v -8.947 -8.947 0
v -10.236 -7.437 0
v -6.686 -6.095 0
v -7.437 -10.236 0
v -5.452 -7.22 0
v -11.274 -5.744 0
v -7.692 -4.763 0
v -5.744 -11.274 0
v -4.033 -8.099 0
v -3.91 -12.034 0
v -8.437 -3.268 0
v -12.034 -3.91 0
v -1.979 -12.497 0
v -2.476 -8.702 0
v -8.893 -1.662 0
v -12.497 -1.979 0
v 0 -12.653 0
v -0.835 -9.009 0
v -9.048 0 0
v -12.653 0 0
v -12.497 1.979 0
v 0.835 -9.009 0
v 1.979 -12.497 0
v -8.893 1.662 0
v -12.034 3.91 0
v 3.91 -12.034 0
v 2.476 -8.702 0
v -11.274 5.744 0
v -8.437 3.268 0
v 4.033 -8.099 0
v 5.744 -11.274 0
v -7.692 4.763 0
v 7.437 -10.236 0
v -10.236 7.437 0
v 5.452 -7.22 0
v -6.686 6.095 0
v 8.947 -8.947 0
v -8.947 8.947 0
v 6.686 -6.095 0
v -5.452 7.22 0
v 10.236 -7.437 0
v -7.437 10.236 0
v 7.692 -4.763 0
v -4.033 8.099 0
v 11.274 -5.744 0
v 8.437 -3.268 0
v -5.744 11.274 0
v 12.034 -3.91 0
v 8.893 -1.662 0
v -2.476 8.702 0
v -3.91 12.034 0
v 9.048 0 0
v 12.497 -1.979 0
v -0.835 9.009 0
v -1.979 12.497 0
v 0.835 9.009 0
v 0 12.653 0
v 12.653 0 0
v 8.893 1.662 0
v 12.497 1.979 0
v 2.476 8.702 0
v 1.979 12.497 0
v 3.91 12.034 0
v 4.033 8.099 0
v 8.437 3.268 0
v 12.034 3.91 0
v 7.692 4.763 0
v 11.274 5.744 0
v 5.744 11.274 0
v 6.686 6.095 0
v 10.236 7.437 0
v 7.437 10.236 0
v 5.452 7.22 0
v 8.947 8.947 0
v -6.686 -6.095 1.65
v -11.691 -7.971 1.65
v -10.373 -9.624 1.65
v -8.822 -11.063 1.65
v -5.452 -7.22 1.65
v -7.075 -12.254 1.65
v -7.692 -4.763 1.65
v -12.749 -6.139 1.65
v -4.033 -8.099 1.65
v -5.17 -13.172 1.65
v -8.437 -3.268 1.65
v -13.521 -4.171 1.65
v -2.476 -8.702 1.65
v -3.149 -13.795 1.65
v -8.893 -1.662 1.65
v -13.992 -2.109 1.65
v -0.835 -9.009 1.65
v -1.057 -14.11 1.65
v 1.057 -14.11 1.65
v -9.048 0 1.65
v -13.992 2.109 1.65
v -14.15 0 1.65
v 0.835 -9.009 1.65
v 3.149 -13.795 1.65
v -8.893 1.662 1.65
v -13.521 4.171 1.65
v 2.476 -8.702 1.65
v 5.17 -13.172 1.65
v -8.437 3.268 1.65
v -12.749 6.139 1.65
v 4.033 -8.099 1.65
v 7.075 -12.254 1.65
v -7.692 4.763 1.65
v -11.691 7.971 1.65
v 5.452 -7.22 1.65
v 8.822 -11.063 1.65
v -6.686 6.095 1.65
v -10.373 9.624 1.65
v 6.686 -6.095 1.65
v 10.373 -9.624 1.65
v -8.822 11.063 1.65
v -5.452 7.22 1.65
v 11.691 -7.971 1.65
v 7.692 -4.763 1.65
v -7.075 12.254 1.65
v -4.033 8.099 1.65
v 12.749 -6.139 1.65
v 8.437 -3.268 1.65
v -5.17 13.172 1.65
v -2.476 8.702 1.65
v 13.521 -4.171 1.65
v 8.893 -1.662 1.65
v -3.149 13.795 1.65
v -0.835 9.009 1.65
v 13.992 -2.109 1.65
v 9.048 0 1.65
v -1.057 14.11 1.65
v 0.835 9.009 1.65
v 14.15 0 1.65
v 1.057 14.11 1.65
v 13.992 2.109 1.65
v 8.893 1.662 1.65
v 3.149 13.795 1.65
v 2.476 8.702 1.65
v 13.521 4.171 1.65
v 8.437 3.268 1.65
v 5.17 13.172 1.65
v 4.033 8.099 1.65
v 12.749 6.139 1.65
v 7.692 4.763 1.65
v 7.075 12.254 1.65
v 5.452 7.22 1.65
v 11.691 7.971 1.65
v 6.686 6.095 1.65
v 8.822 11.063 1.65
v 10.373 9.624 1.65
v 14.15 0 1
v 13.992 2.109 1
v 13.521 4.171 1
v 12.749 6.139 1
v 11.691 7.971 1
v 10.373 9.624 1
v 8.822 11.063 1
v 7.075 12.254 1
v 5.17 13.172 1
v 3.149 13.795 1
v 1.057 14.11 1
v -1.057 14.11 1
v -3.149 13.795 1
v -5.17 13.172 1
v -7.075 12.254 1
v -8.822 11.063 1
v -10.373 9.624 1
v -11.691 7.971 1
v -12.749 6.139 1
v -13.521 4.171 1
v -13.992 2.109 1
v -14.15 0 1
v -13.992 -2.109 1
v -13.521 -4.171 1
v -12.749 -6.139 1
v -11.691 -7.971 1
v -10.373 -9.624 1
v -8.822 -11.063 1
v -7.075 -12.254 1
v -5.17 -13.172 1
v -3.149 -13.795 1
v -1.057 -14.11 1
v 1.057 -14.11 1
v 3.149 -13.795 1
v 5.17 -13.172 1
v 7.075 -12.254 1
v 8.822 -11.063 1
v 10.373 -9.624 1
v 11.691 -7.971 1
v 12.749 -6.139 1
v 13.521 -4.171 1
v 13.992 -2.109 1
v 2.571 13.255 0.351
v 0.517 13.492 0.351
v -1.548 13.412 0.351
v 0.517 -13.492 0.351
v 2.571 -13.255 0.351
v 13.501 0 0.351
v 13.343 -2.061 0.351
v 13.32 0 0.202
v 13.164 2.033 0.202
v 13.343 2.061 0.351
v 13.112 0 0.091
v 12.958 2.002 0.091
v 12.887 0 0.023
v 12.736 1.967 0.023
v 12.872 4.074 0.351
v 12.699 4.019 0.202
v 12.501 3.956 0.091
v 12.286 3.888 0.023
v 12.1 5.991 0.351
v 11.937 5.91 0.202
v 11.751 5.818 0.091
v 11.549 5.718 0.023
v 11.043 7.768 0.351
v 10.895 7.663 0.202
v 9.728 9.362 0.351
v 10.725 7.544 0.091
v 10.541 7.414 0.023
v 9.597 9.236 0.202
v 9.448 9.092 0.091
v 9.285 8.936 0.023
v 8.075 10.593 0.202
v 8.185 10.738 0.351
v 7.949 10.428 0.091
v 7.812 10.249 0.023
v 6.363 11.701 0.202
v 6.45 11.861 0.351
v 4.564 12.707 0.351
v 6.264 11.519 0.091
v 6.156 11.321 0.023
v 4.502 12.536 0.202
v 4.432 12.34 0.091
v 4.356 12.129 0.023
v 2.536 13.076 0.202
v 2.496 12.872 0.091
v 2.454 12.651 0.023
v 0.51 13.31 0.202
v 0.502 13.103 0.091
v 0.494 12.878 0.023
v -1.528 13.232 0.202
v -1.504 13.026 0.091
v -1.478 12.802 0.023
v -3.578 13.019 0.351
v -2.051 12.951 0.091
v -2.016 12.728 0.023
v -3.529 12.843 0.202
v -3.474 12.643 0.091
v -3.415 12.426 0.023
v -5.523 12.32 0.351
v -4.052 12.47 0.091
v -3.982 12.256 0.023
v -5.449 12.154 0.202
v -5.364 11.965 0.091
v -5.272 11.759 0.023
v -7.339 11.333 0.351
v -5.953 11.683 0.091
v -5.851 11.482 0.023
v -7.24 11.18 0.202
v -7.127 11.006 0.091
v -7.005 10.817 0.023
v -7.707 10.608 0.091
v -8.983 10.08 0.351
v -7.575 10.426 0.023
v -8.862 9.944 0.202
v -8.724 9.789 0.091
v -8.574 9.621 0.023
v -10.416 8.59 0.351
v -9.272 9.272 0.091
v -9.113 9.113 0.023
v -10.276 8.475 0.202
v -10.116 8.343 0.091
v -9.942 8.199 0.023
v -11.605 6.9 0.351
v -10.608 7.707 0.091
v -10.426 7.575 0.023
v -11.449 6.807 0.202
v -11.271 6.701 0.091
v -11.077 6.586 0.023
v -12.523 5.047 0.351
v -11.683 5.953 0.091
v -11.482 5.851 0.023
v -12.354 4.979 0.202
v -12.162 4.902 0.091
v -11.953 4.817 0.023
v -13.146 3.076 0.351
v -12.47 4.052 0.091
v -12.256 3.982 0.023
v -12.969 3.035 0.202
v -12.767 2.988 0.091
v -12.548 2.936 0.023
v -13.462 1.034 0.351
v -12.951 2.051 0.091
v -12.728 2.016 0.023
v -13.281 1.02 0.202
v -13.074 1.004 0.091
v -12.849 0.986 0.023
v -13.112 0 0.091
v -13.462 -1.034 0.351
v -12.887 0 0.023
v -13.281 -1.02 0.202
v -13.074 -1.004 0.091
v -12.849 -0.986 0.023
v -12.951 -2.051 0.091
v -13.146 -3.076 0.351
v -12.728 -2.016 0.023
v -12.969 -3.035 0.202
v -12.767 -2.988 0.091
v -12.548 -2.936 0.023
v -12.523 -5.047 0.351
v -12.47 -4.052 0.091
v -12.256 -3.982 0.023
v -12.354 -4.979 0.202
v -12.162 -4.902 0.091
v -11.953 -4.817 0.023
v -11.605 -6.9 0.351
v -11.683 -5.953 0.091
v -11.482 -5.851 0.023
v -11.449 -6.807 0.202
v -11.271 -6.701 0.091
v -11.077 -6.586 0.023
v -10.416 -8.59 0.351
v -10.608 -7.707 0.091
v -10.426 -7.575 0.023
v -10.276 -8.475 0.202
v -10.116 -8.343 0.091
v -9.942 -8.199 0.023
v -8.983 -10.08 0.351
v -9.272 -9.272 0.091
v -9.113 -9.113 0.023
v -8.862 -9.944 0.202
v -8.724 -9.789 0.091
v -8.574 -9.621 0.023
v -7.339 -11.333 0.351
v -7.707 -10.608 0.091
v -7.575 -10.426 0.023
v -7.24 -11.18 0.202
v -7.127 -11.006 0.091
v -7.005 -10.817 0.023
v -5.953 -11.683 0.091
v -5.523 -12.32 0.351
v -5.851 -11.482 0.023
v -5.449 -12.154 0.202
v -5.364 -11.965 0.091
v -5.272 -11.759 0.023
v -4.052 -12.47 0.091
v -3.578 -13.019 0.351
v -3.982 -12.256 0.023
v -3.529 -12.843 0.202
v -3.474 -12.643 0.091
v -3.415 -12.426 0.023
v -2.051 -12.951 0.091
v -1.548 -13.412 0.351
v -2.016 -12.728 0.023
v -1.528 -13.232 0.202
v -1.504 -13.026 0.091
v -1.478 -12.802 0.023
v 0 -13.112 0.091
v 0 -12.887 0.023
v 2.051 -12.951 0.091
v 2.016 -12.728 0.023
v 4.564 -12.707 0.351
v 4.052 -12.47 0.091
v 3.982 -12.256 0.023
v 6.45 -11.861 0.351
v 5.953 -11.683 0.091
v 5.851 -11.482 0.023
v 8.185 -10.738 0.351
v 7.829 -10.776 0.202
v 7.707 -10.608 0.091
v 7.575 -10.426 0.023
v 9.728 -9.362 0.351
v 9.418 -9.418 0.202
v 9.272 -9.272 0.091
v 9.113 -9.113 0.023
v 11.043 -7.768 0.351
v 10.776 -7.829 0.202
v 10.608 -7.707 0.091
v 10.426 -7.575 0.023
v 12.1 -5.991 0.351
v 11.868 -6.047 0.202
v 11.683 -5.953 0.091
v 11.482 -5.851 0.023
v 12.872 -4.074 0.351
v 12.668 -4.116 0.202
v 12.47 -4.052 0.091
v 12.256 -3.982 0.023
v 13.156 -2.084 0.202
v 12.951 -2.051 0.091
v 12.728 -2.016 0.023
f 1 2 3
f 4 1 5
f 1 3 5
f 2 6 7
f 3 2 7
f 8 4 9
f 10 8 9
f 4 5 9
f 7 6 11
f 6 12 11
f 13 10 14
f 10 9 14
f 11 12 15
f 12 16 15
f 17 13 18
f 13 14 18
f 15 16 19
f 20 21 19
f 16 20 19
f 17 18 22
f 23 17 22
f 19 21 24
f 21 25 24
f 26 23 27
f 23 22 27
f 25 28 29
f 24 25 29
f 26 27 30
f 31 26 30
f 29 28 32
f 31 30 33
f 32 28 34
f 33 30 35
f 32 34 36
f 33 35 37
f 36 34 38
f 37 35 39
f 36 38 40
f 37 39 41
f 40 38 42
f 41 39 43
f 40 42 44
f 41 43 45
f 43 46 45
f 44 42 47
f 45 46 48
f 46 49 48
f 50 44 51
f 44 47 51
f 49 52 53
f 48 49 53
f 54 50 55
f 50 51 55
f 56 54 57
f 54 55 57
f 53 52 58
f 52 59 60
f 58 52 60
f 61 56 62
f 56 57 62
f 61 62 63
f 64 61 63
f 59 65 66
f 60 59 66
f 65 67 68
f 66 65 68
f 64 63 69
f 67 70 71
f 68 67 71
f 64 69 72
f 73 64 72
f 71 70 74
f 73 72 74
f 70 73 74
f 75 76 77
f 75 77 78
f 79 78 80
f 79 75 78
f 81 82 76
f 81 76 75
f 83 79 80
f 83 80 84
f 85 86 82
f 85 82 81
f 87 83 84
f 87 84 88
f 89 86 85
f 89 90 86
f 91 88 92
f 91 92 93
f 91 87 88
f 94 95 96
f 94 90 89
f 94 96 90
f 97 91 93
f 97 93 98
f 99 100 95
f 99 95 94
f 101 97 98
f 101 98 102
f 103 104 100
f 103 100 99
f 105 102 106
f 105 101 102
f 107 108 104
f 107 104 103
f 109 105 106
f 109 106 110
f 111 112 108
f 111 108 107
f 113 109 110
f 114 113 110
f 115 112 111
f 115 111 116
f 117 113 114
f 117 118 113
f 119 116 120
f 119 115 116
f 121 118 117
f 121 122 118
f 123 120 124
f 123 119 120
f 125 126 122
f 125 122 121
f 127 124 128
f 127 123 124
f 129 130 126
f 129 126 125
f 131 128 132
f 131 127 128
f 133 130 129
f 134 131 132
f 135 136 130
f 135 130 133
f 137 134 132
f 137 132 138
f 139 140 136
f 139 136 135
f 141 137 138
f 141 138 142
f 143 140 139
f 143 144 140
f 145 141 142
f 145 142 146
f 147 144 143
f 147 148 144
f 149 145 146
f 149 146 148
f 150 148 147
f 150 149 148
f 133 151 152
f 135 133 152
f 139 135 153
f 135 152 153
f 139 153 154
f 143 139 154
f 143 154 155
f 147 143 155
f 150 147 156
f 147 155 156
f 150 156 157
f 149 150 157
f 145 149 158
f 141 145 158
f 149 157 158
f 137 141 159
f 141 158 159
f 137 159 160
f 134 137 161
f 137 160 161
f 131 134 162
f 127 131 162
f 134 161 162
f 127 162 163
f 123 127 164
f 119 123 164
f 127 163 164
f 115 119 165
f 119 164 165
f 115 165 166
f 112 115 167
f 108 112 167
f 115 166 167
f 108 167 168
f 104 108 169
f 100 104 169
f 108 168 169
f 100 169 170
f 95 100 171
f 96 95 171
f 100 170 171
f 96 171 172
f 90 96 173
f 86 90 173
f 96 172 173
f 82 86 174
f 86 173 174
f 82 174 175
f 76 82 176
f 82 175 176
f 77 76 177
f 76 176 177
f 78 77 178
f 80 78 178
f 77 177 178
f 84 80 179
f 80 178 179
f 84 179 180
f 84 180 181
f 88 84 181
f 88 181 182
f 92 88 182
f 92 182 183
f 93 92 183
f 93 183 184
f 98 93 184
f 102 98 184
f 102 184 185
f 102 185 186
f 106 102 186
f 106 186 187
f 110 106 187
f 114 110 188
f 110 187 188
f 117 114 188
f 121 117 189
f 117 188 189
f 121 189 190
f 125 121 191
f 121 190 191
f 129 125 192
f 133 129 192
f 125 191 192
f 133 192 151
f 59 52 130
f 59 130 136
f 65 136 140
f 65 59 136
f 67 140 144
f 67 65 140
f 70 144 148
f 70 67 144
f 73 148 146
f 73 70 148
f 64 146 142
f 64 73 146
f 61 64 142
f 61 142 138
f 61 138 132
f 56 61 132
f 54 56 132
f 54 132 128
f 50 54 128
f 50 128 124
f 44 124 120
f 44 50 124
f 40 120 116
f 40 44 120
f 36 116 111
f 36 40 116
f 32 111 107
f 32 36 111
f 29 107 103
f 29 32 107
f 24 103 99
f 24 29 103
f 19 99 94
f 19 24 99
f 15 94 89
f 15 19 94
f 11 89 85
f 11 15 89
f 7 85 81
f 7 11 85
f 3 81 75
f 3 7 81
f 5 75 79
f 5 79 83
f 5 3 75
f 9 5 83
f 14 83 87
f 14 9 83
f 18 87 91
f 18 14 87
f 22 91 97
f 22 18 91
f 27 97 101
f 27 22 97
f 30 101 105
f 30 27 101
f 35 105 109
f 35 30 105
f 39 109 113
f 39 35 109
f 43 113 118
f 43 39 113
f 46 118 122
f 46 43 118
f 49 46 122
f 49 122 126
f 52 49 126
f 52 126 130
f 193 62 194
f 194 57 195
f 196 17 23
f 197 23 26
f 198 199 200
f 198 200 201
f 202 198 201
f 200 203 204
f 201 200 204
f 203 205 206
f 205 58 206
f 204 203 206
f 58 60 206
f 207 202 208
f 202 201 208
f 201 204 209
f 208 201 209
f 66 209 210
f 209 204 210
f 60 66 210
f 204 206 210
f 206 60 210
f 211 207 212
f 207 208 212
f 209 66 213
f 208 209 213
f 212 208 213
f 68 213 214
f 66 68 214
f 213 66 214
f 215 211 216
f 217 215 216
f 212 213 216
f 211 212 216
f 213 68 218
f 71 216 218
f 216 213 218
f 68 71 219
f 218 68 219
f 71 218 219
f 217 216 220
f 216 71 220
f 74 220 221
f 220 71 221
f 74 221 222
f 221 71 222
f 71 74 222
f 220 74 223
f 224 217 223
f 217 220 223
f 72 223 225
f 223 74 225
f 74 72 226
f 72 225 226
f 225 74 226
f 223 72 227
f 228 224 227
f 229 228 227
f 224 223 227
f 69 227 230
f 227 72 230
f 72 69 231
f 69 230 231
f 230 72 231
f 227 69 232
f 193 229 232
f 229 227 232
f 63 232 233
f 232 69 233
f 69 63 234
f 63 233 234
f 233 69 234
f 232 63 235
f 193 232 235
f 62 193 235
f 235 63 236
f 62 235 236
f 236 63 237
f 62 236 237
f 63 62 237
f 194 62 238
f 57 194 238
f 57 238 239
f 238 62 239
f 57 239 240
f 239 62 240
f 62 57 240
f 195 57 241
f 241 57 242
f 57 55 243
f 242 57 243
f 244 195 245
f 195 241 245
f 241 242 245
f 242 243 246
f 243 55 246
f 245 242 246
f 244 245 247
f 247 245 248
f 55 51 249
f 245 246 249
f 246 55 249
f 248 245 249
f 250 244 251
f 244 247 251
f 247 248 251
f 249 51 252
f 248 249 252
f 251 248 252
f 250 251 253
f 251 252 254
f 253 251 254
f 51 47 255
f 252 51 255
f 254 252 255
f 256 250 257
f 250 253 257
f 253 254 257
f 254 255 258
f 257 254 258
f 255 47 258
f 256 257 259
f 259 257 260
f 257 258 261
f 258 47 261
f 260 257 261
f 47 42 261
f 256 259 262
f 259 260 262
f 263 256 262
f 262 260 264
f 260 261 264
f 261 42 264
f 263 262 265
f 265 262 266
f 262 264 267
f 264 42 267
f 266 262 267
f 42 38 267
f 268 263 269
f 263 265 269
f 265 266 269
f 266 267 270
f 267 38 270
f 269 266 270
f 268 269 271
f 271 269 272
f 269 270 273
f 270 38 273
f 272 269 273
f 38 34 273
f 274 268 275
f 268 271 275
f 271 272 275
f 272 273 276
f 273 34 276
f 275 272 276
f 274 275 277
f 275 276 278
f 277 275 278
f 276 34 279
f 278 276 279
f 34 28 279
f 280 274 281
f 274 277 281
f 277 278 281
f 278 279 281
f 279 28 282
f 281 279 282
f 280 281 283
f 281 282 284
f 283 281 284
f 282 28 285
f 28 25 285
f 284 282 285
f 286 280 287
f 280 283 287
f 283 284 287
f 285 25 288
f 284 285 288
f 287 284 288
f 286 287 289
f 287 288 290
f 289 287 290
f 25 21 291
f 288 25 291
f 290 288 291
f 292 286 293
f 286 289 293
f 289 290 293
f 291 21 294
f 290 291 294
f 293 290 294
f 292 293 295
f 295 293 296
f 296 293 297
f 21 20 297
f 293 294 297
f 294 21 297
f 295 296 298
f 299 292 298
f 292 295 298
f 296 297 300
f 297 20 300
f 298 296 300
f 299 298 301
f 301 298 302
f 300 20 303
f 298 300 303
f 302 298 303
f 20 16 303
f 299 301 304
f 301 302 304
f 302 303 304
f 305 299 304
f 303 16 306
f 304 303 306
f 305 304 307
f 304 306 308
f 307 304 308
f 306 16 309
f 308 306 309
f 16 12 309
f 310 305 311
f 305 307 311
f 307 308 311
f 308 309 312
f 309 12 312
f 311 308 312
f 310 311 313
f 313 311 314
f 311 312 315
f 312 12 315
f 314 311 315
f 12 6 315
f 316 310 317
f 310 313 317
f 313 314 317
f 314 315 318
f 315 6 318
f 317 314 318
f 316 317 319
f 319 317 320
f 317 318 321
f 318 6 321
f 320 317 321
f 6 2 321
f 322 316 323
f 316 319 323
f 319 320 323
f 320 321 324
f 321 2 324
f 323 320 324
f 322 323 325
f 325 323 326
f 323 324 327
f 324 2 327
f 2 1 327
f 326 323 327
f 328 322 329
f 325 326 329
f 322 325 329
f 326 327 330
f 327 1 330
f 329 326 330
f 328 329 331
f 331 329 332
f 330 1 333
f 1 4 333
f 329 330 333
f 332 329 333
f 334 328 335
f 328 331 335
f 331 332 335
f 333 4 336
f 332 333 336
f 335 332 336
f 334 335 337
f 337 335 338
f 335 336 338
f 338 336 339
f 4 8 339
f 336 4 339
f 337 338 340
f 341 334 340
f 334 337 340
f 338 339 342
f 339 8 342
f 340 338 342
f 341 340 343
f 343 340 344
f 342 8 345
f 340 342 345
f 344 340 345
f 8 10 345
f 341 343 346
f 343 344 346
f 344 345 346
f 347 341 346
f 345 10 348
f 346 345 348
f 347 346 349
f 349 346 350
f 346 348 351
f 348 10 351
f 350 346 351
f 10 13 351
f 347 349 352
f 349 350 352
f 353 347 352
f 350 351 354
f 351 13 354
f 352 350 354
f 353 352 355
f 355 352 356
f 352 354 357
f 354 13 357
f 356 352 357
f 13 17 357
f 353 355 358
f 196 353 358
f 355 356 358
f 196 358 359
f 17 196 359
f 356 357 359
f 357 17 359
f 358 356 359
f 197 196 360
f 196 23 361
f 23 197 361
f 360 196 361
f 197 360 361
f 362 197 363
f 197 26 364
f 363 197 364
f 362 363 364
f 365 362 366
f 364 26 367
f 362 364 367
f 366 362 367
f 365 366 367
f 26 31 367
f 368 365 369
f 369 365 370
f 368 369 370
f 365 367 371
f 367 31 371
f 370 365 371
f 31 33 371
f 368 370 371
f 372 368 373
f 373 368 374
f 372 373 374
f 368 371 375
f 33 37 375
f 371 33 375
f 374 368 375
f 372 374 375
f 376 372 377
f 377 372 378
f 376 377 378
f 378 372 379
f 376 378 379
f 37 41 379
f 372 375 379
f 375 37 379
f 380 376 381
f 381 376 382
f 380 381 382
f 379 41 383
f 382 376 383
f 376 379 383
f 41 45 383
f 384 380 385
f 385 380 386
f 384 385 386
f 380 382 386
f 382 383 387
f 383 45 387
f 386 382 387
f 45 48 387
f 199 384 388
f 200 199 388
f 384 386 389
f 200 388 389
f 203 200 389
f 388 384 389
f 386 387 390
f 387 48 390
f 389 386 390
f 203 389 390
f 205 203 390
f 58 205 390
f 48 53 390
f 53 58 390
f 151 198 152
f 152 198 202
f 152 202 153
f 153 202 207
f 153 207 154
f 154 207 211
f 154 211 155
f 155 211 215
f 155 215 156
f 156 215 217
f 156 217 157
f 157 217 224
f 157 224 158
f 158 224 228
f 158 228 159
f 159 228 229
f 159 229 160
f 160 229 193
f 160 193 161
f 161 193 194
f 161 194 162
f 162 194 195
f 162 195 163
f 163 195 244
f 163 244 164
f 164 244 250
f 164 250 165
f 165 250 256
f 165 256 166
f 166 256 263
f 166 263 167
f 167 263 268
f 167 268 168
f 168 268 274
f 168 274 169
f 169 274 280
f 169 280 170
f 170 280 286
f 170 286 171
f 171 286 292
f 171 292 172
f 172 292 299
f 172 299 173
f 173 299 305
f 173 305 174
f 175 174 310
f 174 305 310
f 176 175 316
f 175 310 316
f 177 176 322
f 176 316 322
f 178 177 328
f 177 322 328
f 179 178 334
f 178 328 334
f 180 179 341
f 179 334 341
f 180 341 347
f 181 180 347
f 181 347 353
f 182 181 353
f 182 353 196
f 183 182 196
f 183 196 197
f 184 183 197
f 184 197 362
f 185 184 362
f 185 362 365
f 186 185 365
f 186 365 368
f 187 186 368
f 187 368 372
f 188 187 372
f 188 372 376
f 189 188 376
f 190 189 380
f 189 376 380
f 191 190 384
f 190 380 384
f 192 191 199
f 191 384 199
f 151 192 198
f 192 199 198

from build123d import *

# Parameters (mm, degrees)
F0_R     = 14.15
F0_R_2   = 9.0475
F1_DEPTH = 1.65
F2_SIZE  = 1
F3_R     = 1.2


with BuildPart() as f1:
    # F0 (on Top) → F1 (new body)
    with BuildSketch(Plane.XY):
        Circle(F0_R)
        Circle(F0_R_2, mode=Mode.SUBTRACT)
    extrude(amount=F1_DEPTH)

    # F2
    f2_edges = [f1.edges().sort_by_distance(p)[0] for p in [
        (-14.15, 0, 0),
    ]]
    chamfer(f2_edges, length=F2_SIZE)

    # F3
    f3_edges = [f1.edges().sort_by_distance(p)[0] for p in [
        (-13.15, 0, 0),
    ]]
    fillet(f3_edges, radius=F3_R)


solid = f1.part
